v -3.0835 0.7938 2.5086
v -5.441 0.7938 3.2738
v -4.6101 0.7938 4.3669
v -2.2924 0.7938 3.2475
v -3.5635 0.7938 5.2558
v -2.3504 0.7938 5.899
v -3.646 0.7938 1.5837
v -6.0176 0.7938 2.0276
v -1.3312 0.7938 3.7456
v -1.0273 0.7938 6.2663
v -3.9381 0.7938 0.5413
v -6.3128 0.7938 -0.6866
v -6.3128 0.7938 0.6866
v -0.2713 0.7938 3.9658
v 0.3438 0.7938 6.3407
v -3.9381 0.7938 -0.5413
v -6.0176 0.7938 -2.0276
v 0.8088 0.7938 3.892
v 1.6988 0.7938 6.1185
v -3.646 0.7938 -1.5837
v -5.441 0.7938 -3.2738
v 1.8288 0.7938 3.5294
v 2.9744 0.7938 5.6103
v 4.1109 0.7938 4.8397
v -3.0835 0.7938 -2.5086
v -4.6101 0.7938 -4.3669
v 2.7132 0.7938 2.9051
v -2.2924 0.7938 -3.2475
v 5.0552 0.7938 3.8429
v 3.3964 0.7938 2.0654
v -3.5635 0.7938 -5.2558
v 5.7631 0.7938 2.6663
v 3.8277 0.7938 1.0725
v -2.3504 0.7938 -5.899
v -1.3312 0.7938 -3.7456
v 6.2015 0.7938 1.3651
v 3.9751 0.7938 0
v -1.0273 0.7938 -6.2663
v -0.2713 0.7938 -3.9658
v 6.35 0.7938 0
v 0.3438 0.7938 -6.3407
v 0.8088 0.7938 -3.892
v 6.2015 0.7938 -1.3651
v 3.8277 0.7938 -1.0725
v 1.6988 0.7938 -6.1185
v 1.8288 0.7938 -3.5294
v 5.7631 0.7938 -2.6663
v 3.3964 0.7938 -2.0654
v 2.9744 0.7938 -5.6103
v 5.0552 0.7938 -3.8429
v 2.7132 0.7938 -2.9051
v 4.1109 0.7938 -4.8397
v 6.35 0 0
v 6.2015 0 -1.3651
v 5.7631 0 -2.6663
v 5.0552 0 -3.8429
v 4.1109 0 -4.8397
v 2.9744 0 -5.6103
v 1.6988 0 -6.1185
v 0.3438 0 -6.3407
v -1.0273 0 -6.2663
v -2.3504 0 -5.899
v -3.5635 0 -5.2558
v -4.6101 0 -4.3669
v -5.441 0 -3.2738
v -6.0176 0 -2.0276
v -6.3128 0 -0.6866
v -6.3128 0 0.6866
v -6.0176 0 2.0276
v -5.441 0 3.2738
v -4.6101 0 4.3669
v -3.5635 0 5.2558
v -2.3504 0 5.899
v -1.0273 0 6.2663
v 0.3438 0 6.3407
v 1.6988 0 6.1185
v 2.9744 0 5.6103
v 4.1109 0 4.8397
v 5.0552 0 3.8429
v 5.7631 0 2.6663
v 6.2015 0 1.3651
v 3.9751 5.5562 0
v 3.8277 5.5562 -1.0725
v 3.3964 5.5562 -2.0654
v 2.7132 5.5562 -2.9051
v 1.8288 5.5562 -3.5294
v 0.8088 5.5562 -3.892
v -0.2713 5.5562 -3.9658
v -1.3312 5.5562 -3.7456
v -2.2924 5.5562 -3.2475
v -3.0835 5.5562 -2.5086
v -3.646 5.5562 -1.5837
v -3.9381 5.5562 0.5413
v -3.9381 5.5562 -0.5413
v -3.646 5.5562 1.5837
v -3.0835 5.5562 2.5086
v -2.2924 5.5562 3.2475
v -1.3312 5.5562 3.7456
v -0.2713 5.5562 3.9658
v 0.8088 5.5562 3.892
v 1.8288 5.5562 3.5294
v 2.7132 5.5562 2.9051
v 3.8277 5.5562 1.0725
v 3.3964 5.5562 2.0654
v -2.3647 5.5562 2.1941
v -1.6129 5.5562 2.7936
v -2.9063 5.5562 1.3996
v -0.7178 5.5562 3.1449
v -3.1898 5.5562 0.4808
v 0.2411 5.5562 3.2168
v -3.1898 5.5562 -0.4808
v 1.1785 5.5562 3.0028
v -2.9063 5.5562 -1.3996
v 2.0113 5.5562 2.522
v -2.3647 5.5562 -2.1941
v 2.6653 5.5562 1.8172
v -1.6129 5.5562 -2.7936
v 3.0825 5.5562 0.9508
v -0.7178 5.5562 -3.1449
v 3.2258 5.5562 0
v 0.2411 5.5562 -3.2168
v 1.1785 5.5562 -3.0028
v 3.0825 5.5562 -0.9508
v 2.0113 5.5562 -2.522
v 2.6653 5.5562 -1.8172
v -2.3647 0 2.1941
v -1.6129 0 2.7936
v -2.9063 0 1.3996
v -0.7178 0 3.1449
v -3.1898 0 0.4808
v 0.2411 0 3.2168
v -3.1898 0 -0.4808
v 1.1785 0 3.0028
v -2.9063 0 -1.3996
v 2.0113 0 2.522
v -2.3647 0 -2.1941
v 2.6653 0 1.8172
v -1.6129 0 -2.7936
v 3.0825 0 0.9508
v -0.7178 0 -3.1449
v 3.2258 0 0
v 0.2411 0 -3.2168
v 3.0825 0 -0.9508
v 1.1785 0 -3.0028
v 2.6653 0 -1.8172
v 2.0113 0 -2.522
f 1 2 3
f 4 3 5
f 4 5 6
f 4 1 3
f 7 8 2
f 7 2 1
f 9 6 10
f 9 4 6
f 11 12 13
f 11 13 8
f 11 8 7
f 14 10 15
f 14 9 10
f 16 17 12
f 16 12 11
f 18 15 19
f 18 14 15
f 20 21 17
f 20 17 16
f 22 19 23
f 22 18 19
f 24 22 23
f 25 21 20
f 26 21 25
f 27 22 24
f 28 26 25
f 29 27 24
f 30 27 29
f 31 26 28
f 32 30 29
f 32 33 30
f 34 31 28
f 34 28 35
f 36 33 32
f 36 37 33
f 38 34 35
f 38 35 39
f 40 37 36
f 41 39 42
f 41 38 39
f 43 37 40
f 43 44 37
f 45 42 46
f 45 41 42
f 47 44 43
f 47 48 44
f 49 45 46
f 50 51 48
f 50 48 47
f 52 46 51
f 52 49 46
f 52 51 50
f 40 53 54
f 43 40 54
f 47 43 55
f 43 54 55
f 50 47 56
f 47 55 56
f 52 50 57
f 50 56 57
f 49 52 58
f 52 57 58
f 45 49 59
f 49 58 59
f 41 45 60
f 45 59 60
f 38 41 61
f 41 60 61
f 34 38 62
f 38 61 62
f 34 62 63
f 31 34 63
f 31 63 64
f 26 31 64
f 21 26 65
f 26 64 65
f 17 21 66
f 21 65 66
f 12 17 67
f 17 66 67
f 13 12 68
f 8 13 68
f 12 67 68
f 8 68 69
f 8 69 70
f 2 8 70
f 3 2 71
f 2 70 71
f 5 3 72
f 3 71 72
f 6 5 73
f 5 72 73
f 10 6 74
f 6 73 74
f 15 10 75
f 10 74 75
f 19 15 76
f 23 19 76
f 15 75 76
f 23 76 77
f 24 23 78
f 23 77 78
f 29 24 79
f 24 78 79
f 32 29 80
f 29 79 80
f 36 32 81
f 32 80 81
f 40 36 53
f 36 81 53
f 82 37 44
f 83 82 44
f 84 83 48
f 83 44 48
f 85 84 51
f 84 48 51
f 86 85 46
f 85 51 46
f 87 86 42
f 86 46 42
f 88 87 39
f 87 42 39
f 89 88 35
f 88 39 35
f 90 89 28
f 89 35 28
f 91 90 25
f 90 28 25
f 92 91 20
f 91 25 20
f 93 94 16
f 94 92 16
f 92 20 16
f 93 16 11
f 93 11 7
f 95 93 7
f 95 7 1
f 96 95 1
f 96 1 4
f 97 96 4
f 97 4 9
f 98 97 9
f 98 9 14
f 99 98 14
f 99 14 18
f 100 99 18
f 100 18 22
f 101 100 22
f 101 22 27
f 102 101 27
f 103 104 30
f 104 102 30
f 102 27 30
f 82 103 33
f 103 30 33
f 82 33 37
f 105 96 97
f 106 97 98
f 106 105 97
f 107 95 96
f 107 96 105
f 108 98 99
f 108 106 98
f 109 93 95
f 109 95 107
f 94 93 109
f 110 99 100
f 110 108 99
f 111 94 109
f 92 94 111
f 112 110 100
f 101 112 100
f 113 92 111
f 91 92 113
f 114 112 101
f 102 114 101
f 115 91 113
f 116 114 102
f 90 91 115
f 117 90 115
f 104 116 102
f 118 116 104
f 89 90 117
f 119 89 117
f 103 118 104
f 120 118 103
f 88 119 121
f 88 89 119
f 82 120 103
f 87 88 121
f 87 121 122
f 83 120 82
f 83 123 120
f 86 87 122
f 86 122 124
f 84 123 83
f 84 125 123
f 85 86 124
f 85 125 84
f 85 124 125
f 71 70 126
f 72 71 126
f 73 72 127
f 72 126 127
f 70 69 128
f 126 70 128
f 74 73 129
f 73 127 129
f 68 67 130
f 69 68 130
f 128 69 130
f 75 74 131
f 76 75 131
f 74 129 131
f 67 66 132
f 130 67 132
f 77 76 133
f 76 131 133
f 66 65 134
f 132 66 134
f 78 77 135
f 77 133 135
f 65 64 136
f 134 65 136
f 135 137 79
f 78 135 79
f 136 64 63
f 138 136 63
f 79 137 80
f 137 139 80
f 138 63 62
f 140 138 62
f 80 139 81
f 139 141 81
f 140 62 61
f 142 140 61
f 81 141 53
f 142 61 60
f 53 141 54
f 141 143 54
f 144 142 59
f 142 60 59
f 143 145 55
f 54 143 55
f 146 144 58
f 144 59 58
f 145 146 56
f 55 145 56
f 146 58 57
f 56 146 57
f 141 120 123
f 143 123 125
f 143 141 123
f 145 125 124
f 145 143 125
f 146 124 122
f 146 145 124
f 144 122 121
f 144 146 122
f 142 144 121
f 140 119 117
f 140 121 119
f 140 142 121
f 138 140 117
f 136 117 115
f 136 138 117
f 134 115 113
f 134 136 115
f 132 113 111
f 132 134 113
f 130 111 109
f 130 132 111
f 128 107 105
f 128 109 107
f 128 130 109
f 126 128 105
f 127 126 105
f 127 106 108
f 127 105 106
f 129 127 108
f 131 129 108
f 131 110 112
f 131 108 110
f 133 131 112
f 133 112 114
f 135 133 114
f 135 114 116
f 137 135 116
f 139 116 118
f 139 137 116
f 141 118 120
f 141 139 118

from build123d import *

# Parameters (mm, degrees)
SKETCH2_R           = 3.9751
SKETCH2_R_2         = 3.2258
BOSS_EXTRUDE1_DEPTH = 12.7
SKETCH3_R           = 6.35
SKETCH3_R_2         = 3.9751
BOSS_EXTRUDE2_DEPTH = 0.79375
CUT_EXTRUDE1_START  = 4.7625
SKETCH4_R           = 6.35
CUT_EXTRUDE1_DEPTH  = 8.14375


with BuildPart() as part:
    # Sketch2 → Boss-Extrude1 (new body)
    with BuildSketch(Plane(origin=(0, 0, 0), x_dir=(1, 0, 0), z_dir=(0, 1, 0))):
        Circle(SKETCH2_R)
        Circle(SKETCH2_R_2, mode=Mode.SUBTRACT)
    extrude(amount=BOSS_EXTRUDE1_DEPTH)

    # Sketch3 → Boss-Extrude2 (add)
    with BuildSketch(Plane(origin=(0, 0, 0), x_dir=(1, 0, 0), z_dir=(0, 1, 0))):
        Circle(SKETCH3_R)
        Circle(SKETCH3_R_2, mode=Mode.SUBTRACT)
    extrude(amount=BOSS_EXTRUDE2_DEPTH)

    # Sketch4 → Cut-Extrude1 (cut, through all)
    with BuildSketch(Plane(origin=(0, 0.79375, 0), x_dir=(1, 0, 0), z_dir=(0, 1, 0)).offset(CUT_EXTRUDE1_START)):
        Circle(SKETCH4_R)
    extrude(amount=CUT_EXTRUDE1_DEPTH, mode=Mode.SUBTRACT)


solid = part.part
